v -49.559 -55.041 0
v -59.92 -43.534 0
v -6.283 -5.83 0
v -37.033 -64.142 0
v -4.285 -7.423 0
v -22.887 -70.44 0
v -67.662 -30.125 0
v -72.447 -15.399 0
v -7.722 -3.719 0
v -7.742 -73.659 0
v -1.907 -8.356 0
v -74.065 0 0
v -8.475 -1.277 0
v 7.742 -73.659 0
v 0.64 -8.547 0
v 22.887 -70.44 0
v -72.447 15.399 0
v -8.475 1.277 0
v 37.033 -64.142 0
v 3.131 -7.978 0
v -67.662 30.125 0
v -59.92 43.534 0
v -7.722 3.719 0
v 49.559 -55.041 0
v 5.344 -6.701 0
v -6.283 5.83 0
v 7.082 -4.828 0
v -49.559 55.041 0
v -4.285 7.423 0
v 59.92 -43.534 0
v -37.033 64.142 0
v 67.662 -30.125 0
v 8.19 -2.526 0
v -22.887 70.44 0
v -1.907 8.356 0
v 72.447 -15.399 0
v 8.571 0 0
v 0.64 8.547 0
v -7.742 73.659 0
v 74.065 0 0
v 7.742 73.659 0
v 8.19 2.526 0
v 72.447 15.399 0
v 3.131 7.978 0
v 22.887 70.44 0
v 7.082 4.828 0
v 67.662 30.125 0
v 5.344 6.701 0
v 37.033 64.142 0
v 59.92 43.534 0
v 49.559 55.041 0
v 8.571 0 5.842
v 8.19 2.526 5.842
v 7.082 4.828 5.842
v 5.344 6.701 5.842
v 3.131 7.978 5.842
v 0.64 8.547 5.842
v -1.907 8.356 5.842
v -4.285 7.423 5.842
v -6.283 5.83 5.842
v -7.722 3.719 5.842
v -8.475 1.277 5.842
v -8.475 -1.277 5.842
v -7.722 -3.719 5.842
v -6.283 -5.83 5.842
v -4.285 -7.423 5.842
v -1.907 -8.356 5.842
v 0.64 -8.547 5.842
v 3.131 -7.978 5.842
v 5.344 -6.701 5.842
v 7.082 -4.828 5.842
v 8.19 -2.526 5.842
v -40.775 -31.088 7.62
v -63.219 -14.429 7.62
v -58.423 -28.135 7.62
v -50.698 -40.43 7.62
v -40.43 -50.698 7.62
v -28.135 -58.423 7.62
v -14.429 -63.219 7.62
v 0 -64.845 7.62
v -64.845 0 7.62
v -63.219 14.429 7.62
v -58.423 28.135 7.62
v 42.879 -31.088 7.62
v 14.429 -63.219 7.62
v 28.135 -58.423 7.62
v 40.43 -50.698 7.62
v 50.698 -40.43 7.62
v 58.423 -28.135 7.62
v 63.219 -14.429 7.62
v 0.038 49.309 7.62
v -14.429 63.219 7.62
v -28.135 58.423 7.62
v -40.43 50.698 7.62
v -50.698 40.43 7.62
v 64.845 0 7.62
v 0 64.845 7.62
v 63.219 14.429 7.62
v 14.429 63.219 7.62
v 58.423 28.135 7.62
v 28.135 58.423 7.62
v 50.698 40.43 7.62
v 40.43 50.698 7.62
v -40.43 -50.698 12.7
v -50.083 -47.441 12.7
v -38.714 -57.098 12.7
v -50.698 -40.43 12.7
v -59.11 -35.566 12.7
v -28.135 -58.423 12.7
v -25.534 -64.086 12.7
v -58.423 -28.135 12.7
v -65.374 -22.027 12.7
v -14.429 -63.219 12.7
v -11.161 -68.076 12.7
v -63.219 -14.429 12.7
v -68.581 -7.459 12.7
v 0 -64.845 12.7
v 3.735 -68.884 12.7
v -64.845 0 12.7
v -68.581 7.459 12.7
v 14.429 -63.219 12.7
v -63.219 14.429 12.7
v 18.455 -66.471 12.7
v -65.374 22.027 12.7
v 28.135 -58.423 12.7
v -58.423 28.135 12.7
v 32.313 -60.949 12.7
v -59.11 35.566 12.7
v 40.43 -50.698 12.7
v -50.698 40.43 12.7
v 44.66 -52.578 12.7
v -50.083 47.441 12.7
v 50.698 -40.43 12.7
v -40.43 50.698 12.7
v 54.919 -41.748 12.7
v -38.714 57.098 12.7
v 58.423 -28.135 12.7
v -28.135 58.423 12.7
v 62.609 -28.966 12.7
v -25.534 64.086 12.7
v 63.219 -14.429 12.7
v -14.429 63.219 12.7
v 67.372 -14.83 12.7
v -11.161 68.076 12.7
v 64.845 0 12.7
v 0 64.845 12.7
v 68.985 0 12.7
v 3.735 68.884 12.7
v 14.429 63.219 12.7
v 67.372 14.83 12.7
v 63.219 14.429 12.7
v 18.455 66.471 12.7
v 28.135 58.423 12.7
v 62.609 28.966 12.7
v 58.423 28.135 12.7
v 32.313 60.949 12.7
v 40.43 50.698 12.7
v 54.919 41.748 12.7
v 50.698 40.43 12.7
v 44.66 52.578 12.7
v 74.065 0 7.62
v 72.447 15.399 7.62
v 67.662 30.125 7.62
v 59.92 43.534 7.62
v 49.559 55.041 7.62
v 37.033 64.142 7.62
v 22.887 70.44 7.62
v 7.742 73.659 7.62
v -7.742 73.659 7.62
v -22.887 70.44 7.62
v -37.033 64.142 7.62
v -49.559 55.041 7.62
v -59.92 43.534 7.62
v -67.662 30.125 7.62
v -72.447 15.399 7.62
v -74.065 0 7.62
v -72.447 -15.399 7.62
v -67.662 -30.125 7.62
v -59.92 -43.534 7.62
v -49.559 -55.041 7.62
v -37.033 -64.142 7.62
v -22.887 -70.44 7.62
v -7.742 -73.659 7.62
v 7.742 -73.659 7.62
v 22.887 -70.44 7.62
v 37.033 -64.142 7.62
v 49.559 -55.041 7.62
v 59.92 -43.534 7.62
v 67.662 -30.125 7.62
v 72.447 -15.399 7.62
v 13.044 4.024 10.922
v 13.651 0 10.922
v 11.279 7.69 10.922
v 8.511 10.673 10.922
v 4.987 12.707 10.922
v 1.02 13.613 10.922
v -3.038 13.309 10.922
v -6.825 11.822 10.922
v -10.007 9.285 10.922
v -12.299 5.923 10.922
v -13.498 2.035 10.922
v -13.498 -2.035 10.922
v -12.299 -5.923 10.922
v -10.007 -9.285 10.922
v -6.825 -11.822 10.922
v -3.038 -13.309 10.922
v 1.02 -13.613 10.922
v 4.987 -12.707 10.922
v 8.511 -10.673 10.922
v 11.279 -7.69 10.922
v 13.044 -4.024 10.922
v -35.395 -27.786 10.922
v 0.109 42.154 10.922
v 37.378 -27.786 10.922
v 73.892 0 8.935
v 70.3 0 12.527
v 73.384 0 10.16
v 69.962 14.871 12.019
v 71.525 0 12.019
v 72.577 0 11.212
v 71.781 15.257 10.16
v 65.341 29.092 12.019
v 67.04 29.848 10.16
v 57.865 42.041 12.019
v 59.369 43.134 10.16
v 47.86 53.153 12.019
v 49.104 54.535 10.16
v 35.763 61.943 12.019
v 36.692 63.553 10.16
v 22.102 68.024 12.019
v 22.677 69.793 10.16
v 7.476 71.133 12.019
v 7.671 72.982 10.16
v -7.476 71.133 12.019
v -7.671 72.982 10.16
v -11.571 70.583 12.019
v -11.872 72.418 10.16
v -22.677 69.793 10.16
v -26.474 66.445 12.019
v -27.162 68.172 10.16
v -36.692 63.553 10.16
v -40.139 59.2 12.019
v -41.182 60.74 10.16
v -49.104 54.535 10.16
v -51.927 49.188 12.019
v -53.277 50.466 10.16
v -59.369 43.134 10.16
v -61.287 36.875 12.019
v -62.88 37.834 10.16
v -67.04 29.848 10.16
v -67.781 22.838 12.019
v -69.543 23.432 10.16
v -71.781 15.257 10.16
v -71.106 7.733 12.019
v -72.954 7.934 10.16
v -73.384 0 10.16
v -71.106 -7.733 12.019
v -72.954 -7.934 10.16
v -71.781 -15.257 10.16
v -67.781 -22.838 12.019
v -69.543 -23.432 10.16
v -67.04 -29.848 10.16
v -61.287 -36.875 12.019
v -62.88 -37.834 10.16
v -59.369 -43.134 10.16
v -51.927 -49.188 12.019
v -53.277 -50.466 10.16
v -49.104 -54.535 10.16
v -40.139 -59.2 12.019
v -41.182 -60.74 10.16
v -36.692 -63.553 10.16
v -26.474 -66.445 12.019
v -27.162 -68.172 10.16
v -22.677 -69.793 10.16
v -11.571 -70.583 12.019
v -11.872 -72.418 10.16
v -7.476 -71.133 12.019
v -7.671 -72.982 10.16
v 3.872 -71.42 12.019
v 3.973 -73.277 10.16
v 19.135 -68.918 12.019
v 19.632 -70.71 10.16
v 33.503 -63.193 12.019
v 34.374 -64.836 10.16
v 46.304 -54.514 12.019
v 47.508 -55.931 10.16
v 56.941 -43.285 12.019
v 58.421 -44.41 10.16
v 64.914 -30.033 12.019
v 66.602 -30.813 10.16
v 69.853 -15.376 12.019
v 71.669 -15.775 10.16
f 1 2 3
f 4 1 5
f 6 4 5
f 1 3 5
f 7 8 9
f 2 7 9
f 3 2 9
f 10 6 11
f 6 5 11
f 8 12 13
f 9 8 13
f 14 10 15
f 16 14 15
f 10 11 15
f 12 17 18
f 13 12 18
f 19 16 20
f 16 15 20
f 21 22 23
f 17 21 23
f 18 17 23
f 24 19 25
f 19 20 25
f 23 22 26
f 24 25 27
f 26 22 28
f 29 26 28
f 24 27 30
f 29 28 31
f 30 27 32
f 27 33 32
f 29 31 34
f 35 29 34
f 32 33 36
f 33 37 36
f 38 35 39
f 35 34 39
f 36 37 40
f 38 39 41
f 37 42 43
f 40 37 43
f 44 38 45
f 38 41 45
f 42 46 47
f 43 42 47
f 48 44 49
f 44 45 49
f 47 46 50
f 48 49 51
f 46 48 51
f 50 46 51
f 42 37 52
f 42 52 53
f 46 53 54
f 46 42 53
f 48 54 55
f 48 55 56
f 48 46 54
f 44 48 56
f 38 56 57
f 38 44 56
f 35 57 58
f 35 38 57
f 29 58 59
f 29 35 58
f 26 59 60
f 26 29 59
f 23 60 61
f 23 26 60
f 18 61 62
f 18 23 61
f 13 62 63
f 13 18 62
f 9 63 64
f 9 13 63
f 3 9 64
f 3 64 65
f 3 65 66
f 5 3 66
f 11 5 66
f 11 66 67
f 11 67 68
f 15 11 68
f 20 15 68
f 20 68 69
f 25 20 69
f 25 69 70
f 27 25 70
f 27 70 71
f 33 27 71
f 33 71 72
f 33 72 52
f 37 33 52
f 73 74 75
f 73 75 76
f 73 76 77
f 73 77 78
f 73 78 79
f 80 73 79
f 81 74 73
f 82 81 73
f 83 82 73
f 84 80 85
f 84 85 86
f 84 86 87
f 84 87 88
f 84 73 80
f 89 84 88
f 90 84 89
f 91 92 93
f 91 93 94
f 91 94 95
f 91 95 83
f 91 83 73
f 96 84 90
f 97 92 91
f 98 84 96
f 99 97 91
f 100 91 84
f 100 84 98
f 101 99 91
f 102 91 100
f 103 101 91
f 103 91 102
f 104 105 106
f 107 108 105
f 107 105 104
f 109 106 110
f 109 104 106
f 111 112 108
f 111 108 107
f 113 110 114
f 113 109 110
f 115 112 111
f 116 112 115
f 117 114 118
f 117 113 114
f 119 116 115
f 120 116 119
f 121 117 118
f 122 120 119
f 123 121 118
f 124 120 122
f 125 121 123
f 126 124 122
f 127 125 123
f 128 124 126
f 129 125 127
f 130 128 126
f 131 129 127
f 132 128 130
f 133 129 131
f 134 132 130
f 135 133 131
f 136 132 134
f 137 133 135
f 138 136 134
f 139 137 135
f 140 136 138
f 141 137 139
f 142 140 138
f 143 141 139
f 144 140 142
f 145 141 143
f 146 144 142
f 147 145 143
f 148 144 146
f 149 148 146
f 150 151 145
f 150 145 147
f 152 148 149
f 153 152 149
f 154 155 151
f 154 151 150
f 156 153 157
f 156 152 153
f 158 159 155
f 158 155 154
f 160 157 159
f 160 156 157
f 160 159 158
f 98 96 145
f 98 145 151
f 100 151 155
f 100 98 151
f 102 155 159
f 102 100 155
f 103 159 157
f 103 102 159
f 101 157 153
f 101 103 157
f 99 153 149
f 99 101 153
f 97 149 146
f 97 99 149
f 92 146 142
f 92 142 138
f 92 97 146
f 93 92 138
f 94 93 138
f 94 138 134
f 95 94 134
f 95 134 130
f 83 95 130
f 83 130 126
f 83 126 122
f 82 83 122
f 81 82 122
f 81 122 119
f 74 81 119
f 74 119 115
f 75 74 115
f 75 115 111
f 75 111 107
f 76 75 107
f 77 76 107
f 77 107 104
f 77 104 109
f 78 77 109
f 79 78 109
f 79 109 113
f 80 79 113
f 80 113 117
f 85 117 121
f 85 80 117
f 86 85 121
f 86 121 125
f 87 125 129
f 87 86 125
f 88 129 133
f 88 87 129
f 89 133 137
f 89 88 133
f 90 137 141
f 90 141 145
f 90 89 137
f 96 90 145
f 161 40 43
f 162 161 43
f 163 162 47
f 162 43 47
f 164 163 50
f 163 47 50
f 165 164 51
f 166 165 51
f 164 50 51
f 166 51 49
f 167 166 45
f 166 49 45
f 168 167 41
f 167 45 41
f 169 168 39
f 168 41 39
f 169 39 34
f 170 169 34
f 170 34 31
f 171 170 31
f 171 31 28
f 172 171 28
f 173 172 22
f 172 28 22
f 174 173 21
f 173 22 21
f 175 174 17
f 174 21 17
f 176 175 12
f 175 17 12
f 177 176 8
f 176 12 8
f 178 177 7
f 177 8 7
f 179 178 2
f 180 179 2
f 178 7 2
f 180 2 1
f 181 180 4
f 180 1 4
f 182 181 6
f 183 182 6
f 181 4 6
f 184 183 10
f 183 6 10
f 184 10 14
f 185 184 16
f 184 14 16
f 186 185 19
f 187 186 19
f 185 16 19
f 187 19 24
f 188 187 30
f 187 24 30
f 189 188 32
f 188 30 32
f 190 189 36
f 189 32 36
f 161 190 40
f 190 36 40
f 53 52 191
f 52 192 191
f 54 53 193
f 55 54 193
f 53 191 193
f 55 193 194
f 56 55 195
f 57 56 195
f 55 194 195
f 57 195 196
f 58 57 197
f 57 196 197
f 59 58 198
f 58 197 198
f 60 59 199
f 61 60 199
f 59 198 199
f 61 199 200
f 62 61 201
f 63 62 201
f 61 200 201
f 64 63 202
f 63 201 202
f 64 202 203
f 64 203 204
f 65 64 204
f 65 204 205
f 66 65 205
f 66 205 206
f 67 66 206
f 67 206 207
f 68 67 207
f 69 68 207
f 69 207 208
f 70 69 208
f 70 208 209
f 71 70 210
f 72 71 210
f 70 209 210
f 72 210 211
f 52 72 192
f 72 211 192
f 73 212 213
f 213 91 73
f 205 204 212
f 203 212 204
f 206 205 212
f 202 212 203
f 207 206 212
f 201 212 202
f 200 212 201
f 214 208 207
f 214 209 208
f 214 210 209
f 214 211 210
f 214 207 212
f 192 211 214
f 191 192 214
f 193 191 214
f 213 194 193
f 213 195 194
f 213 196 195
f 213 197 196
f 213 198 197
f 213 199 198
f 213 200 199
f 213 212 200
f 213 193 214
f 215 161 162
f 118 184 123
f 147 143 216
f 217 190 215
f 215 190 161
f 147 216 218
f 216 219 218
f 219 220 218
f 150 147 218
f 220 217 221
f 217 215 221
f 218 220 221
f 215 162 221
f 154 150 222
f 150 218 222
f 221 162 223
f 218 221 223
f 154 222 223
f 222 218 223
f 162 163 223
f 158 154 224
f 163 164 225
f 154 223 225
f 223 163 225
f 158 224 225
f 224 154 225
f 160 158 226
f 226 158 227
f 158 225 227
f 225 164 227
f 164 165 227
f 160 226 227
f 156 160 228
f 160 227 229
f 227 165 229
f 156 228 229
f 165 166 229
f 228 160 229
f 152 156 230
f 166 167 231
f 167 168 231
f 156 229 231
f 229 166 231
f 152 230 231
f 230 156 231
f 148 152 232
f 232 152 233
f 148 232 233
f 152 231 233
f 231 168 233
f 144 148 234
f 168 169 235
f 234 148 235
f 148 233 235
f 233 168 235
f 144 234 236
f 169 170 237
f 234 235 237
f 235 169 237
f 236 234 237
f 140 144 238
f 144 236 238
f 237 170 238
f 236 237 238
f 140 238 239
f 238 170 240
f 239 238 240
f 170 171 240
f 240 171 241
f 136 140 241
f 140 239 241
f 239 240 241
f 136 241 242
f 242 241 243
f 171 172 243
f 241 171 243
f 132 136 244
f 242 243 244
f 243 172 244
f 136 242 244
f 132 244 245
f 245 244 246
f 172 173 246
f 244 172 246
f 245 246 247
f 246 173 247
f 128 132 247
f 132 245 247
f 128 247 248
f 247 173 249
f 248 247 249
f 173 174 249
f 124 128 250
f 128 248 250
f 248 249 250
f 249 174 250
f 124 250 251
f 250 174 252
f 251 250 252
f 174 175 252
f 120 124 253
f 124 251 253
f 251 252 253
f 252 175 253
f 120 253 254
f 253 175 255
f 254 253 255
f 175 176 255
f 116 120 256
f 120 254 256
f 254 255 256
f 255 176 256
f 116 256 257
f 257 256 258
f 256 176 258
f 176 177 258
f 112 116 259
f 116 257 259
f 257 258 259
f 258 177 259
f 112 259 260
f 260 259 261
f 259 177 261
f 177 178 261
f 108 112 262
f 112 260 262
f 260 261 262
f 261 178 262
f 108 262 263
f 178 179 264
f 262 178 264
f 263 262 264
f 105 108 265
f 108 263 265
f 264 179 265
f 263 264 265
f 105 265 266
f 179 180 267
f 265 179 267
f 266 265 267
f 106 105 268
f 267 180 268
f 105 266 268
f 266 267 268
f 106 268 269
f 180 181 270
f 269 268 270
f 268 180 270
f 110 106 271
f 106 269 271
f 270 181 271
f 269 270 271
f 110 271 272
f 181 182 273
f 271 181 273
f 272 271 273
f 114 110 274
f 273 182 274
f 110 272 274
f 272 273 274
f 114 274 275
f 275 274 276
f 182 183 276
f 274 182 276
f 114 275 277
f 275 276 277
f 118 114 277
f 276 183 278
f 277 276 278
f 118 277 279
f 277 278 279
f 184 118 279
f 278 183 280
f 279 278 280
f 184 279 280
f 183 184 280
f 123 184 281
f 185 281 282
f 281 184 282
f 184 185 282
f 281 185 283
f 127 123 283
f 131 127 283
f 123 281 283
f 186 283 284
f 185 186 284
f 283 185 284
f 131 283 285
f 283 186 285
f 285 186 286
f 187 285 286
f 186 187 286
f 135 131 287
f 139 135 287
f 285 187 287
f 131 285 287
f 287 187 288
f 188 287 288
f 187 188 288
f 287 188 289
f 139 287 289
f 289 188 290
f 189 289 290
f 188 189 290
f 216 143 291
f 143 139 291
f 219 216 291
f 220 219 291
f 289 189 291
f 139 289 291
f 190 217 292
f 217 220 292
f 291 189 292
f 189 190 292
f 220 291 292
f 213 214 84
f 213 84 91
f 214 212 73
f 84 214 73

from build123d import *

# Parameters (mm, degrees)
F0_R         = 74.0650481318
F0_R_2       = 64.8450067866
F1_DEPTH     = 12.7
F2_DEPTH     = 7.62
F0_R_3       = 8.5707717009
F3_DEPTH     = 10.922
F4_R         = 5.08
F5_T4_DEPTH  = 123.6076762244
F5_T11_DEPTH = 122.6061545132
F5_T18_DEPTH = 115.6407516409


# Not quite as in the source:
# - a fillet or chamfer that OpenCascade refuses, or shapes differently, is made with other operations: its cross-section is extruded or revolved along the edge and cut away or added


with BuildPart() as f1:
    # F0 (on Top) → F1 (new body)
    with BuildSketch(Plane.XY):
        Circle(F0_R)
        Circle(F0_R_2, mode=Mode.SUBTRACT)
    extrude(amount=F1_DEPTH)

    # F0 (on Top) → F2 (join)
    with BuildSketch(Plane.XY):
        Circle(F0_R_2)
        Polygon((45.8412840962, -32.8662097454), (-43.6711683869, -32.8662097454), (0, 53.1617254019), align=None, mode=Mode.SUBTRACT)
    extrude(amount=F2_DEPTH)

    # F0 (on Top) → F3 (join)
    with BuildSketch(Plane.XY):
        Polygon((0, 53.1617254019), (-43.6711683869, -32.8662097454), (45.8412840962, -32.8662097454), align=None)
        Circle(F0_R_3, mode=Mode.SUBTRACT)
    extrude(amount=F3_DEPTH)

    # F4
    f4_edges = [f1.edges().sort_by_distance(p)[0] for p in [
        (-74.065048, 0, 12.7),
    ]]
    fillet(f4_edges, radius=F4_R)

    # F5: chamfer of 5.08 on 4 edges, made by hand


with BuildPart() as f5_tool2:
    # F5_s3 → F5_t4 (new body)
    with BuildSketch(Plane(origin=(29.9216472697, -56.1523871237, 0), x_dir=(0, 0, 1), z_dir=(-0.4702664859, 0.8825244655, 0))):
        Polygon((10.922, 19.9201777866), (5.842, 25.0001777866), (10.922, 25.0001777866), align=None)
    extrude(amount=F5_T4_DEPTH)

    split(bisect_by=Plane.XY.offset(7.62), keep=Keep.TOP)

    split(bisect_by=Plane(origin=(-21.4574493748, 10.8926464781, 0), x_dir=(0, 0, 1), z_dir=(0.8916858157, -0.4526548422, 0)), keep=Keep.TOP)

    split(bisect_by=Plane.XZ.offset(32.8662097454), keep=Keep.BOTTOM)


with BuildPart() as f1_1:
    add(f1.part)

    # F5_t1: cut F5_tool2
    add(f5_tool2.part, mode=Mode.SUBTRACT)


with BuildPart() as f5_tool9:
    # F5_s10 → F5_t11 (new body)
    with BuildSketch(Plane(origin=(27.3709999402, 53.9181957971, 0), x_dir=(0, 0, 1), z_dir=(-0.4526548422, -0.8916858157, 0))):
        Polygon((10.922, 18.9839124202), (5.842, 24.0639124202), (10.922, 24.0639124202), align=None)
    extrude(amount=F5_T11_DEPTH)

    split(bisect_by=Plane.XY.offset(7.62), keep=Keep.TOP)

    split(bisect_by=Plane(origin=(22.0632685396, 11.7567457534, 0), x_dir=(0, 0, 1), z_dir=(-0.8825244655, -0.4702664859, 0)), keep=Keep.TOP)

    split(bisect_by=Plane.XZ.offset(32.8662097454), keep=Keep.BOTTOM)


with BuildPart() as f1_2:
    add(f1_1.part)

    # F5_t8: cut F5_tool9
    add(f5_tool9.part, mode=Mode.SUBTRACT)


with BuildPart() as f5_tool16:
    # F5_s17 → F5_t18 (new body)
    with BuildSketch(Plane.YZ.offset(-56.7353179658)):
        Polygon((-27.7862097454, 10.922), (-32.8662097454, 5.842), (-32.8662097454, 10.922), align=None)
    extrude(amount=F5_T18_DEPTH)

    split(bisect_by=Plane.XY.offset(7.62), keep=Keep.TOP)

    split(bisect_by=Plane(origin=(22.0632685396, 11.7567457534, 0), x_dir=(0, 0, 1), z_dir=(-0.8825244655, -0.4702664859, 0)), keep=Keep.TOP)

    split(bisect_by=Plane(origin=(-21.4574493748, 10.8926464781, 0), x_dir=(0, 0, 1), z_dir=(0.8916858157, -0.4526548422, 0)), keep=Keep.TOP)


with BuildPart() as f1_3:
    add(f1_2.part)

    # F5_t15: cut F5_tool16
    add(f5_tool16.part, mode=Mode.SUBTRACT)

    # F5_s22 → F5_t23 (revolve, cut)
    with BuildSketch(Plane.XZ):
        Polygon((8.5707717009, 5.842), (13.6507717009, 10.922), (8.5707717009, 10.922), align=None)
    revolve(axis=Axis((0, 0, 10.922), (0, 0, 1)), mode=Mode.SUBTRACT)


solid = f1_3.part
